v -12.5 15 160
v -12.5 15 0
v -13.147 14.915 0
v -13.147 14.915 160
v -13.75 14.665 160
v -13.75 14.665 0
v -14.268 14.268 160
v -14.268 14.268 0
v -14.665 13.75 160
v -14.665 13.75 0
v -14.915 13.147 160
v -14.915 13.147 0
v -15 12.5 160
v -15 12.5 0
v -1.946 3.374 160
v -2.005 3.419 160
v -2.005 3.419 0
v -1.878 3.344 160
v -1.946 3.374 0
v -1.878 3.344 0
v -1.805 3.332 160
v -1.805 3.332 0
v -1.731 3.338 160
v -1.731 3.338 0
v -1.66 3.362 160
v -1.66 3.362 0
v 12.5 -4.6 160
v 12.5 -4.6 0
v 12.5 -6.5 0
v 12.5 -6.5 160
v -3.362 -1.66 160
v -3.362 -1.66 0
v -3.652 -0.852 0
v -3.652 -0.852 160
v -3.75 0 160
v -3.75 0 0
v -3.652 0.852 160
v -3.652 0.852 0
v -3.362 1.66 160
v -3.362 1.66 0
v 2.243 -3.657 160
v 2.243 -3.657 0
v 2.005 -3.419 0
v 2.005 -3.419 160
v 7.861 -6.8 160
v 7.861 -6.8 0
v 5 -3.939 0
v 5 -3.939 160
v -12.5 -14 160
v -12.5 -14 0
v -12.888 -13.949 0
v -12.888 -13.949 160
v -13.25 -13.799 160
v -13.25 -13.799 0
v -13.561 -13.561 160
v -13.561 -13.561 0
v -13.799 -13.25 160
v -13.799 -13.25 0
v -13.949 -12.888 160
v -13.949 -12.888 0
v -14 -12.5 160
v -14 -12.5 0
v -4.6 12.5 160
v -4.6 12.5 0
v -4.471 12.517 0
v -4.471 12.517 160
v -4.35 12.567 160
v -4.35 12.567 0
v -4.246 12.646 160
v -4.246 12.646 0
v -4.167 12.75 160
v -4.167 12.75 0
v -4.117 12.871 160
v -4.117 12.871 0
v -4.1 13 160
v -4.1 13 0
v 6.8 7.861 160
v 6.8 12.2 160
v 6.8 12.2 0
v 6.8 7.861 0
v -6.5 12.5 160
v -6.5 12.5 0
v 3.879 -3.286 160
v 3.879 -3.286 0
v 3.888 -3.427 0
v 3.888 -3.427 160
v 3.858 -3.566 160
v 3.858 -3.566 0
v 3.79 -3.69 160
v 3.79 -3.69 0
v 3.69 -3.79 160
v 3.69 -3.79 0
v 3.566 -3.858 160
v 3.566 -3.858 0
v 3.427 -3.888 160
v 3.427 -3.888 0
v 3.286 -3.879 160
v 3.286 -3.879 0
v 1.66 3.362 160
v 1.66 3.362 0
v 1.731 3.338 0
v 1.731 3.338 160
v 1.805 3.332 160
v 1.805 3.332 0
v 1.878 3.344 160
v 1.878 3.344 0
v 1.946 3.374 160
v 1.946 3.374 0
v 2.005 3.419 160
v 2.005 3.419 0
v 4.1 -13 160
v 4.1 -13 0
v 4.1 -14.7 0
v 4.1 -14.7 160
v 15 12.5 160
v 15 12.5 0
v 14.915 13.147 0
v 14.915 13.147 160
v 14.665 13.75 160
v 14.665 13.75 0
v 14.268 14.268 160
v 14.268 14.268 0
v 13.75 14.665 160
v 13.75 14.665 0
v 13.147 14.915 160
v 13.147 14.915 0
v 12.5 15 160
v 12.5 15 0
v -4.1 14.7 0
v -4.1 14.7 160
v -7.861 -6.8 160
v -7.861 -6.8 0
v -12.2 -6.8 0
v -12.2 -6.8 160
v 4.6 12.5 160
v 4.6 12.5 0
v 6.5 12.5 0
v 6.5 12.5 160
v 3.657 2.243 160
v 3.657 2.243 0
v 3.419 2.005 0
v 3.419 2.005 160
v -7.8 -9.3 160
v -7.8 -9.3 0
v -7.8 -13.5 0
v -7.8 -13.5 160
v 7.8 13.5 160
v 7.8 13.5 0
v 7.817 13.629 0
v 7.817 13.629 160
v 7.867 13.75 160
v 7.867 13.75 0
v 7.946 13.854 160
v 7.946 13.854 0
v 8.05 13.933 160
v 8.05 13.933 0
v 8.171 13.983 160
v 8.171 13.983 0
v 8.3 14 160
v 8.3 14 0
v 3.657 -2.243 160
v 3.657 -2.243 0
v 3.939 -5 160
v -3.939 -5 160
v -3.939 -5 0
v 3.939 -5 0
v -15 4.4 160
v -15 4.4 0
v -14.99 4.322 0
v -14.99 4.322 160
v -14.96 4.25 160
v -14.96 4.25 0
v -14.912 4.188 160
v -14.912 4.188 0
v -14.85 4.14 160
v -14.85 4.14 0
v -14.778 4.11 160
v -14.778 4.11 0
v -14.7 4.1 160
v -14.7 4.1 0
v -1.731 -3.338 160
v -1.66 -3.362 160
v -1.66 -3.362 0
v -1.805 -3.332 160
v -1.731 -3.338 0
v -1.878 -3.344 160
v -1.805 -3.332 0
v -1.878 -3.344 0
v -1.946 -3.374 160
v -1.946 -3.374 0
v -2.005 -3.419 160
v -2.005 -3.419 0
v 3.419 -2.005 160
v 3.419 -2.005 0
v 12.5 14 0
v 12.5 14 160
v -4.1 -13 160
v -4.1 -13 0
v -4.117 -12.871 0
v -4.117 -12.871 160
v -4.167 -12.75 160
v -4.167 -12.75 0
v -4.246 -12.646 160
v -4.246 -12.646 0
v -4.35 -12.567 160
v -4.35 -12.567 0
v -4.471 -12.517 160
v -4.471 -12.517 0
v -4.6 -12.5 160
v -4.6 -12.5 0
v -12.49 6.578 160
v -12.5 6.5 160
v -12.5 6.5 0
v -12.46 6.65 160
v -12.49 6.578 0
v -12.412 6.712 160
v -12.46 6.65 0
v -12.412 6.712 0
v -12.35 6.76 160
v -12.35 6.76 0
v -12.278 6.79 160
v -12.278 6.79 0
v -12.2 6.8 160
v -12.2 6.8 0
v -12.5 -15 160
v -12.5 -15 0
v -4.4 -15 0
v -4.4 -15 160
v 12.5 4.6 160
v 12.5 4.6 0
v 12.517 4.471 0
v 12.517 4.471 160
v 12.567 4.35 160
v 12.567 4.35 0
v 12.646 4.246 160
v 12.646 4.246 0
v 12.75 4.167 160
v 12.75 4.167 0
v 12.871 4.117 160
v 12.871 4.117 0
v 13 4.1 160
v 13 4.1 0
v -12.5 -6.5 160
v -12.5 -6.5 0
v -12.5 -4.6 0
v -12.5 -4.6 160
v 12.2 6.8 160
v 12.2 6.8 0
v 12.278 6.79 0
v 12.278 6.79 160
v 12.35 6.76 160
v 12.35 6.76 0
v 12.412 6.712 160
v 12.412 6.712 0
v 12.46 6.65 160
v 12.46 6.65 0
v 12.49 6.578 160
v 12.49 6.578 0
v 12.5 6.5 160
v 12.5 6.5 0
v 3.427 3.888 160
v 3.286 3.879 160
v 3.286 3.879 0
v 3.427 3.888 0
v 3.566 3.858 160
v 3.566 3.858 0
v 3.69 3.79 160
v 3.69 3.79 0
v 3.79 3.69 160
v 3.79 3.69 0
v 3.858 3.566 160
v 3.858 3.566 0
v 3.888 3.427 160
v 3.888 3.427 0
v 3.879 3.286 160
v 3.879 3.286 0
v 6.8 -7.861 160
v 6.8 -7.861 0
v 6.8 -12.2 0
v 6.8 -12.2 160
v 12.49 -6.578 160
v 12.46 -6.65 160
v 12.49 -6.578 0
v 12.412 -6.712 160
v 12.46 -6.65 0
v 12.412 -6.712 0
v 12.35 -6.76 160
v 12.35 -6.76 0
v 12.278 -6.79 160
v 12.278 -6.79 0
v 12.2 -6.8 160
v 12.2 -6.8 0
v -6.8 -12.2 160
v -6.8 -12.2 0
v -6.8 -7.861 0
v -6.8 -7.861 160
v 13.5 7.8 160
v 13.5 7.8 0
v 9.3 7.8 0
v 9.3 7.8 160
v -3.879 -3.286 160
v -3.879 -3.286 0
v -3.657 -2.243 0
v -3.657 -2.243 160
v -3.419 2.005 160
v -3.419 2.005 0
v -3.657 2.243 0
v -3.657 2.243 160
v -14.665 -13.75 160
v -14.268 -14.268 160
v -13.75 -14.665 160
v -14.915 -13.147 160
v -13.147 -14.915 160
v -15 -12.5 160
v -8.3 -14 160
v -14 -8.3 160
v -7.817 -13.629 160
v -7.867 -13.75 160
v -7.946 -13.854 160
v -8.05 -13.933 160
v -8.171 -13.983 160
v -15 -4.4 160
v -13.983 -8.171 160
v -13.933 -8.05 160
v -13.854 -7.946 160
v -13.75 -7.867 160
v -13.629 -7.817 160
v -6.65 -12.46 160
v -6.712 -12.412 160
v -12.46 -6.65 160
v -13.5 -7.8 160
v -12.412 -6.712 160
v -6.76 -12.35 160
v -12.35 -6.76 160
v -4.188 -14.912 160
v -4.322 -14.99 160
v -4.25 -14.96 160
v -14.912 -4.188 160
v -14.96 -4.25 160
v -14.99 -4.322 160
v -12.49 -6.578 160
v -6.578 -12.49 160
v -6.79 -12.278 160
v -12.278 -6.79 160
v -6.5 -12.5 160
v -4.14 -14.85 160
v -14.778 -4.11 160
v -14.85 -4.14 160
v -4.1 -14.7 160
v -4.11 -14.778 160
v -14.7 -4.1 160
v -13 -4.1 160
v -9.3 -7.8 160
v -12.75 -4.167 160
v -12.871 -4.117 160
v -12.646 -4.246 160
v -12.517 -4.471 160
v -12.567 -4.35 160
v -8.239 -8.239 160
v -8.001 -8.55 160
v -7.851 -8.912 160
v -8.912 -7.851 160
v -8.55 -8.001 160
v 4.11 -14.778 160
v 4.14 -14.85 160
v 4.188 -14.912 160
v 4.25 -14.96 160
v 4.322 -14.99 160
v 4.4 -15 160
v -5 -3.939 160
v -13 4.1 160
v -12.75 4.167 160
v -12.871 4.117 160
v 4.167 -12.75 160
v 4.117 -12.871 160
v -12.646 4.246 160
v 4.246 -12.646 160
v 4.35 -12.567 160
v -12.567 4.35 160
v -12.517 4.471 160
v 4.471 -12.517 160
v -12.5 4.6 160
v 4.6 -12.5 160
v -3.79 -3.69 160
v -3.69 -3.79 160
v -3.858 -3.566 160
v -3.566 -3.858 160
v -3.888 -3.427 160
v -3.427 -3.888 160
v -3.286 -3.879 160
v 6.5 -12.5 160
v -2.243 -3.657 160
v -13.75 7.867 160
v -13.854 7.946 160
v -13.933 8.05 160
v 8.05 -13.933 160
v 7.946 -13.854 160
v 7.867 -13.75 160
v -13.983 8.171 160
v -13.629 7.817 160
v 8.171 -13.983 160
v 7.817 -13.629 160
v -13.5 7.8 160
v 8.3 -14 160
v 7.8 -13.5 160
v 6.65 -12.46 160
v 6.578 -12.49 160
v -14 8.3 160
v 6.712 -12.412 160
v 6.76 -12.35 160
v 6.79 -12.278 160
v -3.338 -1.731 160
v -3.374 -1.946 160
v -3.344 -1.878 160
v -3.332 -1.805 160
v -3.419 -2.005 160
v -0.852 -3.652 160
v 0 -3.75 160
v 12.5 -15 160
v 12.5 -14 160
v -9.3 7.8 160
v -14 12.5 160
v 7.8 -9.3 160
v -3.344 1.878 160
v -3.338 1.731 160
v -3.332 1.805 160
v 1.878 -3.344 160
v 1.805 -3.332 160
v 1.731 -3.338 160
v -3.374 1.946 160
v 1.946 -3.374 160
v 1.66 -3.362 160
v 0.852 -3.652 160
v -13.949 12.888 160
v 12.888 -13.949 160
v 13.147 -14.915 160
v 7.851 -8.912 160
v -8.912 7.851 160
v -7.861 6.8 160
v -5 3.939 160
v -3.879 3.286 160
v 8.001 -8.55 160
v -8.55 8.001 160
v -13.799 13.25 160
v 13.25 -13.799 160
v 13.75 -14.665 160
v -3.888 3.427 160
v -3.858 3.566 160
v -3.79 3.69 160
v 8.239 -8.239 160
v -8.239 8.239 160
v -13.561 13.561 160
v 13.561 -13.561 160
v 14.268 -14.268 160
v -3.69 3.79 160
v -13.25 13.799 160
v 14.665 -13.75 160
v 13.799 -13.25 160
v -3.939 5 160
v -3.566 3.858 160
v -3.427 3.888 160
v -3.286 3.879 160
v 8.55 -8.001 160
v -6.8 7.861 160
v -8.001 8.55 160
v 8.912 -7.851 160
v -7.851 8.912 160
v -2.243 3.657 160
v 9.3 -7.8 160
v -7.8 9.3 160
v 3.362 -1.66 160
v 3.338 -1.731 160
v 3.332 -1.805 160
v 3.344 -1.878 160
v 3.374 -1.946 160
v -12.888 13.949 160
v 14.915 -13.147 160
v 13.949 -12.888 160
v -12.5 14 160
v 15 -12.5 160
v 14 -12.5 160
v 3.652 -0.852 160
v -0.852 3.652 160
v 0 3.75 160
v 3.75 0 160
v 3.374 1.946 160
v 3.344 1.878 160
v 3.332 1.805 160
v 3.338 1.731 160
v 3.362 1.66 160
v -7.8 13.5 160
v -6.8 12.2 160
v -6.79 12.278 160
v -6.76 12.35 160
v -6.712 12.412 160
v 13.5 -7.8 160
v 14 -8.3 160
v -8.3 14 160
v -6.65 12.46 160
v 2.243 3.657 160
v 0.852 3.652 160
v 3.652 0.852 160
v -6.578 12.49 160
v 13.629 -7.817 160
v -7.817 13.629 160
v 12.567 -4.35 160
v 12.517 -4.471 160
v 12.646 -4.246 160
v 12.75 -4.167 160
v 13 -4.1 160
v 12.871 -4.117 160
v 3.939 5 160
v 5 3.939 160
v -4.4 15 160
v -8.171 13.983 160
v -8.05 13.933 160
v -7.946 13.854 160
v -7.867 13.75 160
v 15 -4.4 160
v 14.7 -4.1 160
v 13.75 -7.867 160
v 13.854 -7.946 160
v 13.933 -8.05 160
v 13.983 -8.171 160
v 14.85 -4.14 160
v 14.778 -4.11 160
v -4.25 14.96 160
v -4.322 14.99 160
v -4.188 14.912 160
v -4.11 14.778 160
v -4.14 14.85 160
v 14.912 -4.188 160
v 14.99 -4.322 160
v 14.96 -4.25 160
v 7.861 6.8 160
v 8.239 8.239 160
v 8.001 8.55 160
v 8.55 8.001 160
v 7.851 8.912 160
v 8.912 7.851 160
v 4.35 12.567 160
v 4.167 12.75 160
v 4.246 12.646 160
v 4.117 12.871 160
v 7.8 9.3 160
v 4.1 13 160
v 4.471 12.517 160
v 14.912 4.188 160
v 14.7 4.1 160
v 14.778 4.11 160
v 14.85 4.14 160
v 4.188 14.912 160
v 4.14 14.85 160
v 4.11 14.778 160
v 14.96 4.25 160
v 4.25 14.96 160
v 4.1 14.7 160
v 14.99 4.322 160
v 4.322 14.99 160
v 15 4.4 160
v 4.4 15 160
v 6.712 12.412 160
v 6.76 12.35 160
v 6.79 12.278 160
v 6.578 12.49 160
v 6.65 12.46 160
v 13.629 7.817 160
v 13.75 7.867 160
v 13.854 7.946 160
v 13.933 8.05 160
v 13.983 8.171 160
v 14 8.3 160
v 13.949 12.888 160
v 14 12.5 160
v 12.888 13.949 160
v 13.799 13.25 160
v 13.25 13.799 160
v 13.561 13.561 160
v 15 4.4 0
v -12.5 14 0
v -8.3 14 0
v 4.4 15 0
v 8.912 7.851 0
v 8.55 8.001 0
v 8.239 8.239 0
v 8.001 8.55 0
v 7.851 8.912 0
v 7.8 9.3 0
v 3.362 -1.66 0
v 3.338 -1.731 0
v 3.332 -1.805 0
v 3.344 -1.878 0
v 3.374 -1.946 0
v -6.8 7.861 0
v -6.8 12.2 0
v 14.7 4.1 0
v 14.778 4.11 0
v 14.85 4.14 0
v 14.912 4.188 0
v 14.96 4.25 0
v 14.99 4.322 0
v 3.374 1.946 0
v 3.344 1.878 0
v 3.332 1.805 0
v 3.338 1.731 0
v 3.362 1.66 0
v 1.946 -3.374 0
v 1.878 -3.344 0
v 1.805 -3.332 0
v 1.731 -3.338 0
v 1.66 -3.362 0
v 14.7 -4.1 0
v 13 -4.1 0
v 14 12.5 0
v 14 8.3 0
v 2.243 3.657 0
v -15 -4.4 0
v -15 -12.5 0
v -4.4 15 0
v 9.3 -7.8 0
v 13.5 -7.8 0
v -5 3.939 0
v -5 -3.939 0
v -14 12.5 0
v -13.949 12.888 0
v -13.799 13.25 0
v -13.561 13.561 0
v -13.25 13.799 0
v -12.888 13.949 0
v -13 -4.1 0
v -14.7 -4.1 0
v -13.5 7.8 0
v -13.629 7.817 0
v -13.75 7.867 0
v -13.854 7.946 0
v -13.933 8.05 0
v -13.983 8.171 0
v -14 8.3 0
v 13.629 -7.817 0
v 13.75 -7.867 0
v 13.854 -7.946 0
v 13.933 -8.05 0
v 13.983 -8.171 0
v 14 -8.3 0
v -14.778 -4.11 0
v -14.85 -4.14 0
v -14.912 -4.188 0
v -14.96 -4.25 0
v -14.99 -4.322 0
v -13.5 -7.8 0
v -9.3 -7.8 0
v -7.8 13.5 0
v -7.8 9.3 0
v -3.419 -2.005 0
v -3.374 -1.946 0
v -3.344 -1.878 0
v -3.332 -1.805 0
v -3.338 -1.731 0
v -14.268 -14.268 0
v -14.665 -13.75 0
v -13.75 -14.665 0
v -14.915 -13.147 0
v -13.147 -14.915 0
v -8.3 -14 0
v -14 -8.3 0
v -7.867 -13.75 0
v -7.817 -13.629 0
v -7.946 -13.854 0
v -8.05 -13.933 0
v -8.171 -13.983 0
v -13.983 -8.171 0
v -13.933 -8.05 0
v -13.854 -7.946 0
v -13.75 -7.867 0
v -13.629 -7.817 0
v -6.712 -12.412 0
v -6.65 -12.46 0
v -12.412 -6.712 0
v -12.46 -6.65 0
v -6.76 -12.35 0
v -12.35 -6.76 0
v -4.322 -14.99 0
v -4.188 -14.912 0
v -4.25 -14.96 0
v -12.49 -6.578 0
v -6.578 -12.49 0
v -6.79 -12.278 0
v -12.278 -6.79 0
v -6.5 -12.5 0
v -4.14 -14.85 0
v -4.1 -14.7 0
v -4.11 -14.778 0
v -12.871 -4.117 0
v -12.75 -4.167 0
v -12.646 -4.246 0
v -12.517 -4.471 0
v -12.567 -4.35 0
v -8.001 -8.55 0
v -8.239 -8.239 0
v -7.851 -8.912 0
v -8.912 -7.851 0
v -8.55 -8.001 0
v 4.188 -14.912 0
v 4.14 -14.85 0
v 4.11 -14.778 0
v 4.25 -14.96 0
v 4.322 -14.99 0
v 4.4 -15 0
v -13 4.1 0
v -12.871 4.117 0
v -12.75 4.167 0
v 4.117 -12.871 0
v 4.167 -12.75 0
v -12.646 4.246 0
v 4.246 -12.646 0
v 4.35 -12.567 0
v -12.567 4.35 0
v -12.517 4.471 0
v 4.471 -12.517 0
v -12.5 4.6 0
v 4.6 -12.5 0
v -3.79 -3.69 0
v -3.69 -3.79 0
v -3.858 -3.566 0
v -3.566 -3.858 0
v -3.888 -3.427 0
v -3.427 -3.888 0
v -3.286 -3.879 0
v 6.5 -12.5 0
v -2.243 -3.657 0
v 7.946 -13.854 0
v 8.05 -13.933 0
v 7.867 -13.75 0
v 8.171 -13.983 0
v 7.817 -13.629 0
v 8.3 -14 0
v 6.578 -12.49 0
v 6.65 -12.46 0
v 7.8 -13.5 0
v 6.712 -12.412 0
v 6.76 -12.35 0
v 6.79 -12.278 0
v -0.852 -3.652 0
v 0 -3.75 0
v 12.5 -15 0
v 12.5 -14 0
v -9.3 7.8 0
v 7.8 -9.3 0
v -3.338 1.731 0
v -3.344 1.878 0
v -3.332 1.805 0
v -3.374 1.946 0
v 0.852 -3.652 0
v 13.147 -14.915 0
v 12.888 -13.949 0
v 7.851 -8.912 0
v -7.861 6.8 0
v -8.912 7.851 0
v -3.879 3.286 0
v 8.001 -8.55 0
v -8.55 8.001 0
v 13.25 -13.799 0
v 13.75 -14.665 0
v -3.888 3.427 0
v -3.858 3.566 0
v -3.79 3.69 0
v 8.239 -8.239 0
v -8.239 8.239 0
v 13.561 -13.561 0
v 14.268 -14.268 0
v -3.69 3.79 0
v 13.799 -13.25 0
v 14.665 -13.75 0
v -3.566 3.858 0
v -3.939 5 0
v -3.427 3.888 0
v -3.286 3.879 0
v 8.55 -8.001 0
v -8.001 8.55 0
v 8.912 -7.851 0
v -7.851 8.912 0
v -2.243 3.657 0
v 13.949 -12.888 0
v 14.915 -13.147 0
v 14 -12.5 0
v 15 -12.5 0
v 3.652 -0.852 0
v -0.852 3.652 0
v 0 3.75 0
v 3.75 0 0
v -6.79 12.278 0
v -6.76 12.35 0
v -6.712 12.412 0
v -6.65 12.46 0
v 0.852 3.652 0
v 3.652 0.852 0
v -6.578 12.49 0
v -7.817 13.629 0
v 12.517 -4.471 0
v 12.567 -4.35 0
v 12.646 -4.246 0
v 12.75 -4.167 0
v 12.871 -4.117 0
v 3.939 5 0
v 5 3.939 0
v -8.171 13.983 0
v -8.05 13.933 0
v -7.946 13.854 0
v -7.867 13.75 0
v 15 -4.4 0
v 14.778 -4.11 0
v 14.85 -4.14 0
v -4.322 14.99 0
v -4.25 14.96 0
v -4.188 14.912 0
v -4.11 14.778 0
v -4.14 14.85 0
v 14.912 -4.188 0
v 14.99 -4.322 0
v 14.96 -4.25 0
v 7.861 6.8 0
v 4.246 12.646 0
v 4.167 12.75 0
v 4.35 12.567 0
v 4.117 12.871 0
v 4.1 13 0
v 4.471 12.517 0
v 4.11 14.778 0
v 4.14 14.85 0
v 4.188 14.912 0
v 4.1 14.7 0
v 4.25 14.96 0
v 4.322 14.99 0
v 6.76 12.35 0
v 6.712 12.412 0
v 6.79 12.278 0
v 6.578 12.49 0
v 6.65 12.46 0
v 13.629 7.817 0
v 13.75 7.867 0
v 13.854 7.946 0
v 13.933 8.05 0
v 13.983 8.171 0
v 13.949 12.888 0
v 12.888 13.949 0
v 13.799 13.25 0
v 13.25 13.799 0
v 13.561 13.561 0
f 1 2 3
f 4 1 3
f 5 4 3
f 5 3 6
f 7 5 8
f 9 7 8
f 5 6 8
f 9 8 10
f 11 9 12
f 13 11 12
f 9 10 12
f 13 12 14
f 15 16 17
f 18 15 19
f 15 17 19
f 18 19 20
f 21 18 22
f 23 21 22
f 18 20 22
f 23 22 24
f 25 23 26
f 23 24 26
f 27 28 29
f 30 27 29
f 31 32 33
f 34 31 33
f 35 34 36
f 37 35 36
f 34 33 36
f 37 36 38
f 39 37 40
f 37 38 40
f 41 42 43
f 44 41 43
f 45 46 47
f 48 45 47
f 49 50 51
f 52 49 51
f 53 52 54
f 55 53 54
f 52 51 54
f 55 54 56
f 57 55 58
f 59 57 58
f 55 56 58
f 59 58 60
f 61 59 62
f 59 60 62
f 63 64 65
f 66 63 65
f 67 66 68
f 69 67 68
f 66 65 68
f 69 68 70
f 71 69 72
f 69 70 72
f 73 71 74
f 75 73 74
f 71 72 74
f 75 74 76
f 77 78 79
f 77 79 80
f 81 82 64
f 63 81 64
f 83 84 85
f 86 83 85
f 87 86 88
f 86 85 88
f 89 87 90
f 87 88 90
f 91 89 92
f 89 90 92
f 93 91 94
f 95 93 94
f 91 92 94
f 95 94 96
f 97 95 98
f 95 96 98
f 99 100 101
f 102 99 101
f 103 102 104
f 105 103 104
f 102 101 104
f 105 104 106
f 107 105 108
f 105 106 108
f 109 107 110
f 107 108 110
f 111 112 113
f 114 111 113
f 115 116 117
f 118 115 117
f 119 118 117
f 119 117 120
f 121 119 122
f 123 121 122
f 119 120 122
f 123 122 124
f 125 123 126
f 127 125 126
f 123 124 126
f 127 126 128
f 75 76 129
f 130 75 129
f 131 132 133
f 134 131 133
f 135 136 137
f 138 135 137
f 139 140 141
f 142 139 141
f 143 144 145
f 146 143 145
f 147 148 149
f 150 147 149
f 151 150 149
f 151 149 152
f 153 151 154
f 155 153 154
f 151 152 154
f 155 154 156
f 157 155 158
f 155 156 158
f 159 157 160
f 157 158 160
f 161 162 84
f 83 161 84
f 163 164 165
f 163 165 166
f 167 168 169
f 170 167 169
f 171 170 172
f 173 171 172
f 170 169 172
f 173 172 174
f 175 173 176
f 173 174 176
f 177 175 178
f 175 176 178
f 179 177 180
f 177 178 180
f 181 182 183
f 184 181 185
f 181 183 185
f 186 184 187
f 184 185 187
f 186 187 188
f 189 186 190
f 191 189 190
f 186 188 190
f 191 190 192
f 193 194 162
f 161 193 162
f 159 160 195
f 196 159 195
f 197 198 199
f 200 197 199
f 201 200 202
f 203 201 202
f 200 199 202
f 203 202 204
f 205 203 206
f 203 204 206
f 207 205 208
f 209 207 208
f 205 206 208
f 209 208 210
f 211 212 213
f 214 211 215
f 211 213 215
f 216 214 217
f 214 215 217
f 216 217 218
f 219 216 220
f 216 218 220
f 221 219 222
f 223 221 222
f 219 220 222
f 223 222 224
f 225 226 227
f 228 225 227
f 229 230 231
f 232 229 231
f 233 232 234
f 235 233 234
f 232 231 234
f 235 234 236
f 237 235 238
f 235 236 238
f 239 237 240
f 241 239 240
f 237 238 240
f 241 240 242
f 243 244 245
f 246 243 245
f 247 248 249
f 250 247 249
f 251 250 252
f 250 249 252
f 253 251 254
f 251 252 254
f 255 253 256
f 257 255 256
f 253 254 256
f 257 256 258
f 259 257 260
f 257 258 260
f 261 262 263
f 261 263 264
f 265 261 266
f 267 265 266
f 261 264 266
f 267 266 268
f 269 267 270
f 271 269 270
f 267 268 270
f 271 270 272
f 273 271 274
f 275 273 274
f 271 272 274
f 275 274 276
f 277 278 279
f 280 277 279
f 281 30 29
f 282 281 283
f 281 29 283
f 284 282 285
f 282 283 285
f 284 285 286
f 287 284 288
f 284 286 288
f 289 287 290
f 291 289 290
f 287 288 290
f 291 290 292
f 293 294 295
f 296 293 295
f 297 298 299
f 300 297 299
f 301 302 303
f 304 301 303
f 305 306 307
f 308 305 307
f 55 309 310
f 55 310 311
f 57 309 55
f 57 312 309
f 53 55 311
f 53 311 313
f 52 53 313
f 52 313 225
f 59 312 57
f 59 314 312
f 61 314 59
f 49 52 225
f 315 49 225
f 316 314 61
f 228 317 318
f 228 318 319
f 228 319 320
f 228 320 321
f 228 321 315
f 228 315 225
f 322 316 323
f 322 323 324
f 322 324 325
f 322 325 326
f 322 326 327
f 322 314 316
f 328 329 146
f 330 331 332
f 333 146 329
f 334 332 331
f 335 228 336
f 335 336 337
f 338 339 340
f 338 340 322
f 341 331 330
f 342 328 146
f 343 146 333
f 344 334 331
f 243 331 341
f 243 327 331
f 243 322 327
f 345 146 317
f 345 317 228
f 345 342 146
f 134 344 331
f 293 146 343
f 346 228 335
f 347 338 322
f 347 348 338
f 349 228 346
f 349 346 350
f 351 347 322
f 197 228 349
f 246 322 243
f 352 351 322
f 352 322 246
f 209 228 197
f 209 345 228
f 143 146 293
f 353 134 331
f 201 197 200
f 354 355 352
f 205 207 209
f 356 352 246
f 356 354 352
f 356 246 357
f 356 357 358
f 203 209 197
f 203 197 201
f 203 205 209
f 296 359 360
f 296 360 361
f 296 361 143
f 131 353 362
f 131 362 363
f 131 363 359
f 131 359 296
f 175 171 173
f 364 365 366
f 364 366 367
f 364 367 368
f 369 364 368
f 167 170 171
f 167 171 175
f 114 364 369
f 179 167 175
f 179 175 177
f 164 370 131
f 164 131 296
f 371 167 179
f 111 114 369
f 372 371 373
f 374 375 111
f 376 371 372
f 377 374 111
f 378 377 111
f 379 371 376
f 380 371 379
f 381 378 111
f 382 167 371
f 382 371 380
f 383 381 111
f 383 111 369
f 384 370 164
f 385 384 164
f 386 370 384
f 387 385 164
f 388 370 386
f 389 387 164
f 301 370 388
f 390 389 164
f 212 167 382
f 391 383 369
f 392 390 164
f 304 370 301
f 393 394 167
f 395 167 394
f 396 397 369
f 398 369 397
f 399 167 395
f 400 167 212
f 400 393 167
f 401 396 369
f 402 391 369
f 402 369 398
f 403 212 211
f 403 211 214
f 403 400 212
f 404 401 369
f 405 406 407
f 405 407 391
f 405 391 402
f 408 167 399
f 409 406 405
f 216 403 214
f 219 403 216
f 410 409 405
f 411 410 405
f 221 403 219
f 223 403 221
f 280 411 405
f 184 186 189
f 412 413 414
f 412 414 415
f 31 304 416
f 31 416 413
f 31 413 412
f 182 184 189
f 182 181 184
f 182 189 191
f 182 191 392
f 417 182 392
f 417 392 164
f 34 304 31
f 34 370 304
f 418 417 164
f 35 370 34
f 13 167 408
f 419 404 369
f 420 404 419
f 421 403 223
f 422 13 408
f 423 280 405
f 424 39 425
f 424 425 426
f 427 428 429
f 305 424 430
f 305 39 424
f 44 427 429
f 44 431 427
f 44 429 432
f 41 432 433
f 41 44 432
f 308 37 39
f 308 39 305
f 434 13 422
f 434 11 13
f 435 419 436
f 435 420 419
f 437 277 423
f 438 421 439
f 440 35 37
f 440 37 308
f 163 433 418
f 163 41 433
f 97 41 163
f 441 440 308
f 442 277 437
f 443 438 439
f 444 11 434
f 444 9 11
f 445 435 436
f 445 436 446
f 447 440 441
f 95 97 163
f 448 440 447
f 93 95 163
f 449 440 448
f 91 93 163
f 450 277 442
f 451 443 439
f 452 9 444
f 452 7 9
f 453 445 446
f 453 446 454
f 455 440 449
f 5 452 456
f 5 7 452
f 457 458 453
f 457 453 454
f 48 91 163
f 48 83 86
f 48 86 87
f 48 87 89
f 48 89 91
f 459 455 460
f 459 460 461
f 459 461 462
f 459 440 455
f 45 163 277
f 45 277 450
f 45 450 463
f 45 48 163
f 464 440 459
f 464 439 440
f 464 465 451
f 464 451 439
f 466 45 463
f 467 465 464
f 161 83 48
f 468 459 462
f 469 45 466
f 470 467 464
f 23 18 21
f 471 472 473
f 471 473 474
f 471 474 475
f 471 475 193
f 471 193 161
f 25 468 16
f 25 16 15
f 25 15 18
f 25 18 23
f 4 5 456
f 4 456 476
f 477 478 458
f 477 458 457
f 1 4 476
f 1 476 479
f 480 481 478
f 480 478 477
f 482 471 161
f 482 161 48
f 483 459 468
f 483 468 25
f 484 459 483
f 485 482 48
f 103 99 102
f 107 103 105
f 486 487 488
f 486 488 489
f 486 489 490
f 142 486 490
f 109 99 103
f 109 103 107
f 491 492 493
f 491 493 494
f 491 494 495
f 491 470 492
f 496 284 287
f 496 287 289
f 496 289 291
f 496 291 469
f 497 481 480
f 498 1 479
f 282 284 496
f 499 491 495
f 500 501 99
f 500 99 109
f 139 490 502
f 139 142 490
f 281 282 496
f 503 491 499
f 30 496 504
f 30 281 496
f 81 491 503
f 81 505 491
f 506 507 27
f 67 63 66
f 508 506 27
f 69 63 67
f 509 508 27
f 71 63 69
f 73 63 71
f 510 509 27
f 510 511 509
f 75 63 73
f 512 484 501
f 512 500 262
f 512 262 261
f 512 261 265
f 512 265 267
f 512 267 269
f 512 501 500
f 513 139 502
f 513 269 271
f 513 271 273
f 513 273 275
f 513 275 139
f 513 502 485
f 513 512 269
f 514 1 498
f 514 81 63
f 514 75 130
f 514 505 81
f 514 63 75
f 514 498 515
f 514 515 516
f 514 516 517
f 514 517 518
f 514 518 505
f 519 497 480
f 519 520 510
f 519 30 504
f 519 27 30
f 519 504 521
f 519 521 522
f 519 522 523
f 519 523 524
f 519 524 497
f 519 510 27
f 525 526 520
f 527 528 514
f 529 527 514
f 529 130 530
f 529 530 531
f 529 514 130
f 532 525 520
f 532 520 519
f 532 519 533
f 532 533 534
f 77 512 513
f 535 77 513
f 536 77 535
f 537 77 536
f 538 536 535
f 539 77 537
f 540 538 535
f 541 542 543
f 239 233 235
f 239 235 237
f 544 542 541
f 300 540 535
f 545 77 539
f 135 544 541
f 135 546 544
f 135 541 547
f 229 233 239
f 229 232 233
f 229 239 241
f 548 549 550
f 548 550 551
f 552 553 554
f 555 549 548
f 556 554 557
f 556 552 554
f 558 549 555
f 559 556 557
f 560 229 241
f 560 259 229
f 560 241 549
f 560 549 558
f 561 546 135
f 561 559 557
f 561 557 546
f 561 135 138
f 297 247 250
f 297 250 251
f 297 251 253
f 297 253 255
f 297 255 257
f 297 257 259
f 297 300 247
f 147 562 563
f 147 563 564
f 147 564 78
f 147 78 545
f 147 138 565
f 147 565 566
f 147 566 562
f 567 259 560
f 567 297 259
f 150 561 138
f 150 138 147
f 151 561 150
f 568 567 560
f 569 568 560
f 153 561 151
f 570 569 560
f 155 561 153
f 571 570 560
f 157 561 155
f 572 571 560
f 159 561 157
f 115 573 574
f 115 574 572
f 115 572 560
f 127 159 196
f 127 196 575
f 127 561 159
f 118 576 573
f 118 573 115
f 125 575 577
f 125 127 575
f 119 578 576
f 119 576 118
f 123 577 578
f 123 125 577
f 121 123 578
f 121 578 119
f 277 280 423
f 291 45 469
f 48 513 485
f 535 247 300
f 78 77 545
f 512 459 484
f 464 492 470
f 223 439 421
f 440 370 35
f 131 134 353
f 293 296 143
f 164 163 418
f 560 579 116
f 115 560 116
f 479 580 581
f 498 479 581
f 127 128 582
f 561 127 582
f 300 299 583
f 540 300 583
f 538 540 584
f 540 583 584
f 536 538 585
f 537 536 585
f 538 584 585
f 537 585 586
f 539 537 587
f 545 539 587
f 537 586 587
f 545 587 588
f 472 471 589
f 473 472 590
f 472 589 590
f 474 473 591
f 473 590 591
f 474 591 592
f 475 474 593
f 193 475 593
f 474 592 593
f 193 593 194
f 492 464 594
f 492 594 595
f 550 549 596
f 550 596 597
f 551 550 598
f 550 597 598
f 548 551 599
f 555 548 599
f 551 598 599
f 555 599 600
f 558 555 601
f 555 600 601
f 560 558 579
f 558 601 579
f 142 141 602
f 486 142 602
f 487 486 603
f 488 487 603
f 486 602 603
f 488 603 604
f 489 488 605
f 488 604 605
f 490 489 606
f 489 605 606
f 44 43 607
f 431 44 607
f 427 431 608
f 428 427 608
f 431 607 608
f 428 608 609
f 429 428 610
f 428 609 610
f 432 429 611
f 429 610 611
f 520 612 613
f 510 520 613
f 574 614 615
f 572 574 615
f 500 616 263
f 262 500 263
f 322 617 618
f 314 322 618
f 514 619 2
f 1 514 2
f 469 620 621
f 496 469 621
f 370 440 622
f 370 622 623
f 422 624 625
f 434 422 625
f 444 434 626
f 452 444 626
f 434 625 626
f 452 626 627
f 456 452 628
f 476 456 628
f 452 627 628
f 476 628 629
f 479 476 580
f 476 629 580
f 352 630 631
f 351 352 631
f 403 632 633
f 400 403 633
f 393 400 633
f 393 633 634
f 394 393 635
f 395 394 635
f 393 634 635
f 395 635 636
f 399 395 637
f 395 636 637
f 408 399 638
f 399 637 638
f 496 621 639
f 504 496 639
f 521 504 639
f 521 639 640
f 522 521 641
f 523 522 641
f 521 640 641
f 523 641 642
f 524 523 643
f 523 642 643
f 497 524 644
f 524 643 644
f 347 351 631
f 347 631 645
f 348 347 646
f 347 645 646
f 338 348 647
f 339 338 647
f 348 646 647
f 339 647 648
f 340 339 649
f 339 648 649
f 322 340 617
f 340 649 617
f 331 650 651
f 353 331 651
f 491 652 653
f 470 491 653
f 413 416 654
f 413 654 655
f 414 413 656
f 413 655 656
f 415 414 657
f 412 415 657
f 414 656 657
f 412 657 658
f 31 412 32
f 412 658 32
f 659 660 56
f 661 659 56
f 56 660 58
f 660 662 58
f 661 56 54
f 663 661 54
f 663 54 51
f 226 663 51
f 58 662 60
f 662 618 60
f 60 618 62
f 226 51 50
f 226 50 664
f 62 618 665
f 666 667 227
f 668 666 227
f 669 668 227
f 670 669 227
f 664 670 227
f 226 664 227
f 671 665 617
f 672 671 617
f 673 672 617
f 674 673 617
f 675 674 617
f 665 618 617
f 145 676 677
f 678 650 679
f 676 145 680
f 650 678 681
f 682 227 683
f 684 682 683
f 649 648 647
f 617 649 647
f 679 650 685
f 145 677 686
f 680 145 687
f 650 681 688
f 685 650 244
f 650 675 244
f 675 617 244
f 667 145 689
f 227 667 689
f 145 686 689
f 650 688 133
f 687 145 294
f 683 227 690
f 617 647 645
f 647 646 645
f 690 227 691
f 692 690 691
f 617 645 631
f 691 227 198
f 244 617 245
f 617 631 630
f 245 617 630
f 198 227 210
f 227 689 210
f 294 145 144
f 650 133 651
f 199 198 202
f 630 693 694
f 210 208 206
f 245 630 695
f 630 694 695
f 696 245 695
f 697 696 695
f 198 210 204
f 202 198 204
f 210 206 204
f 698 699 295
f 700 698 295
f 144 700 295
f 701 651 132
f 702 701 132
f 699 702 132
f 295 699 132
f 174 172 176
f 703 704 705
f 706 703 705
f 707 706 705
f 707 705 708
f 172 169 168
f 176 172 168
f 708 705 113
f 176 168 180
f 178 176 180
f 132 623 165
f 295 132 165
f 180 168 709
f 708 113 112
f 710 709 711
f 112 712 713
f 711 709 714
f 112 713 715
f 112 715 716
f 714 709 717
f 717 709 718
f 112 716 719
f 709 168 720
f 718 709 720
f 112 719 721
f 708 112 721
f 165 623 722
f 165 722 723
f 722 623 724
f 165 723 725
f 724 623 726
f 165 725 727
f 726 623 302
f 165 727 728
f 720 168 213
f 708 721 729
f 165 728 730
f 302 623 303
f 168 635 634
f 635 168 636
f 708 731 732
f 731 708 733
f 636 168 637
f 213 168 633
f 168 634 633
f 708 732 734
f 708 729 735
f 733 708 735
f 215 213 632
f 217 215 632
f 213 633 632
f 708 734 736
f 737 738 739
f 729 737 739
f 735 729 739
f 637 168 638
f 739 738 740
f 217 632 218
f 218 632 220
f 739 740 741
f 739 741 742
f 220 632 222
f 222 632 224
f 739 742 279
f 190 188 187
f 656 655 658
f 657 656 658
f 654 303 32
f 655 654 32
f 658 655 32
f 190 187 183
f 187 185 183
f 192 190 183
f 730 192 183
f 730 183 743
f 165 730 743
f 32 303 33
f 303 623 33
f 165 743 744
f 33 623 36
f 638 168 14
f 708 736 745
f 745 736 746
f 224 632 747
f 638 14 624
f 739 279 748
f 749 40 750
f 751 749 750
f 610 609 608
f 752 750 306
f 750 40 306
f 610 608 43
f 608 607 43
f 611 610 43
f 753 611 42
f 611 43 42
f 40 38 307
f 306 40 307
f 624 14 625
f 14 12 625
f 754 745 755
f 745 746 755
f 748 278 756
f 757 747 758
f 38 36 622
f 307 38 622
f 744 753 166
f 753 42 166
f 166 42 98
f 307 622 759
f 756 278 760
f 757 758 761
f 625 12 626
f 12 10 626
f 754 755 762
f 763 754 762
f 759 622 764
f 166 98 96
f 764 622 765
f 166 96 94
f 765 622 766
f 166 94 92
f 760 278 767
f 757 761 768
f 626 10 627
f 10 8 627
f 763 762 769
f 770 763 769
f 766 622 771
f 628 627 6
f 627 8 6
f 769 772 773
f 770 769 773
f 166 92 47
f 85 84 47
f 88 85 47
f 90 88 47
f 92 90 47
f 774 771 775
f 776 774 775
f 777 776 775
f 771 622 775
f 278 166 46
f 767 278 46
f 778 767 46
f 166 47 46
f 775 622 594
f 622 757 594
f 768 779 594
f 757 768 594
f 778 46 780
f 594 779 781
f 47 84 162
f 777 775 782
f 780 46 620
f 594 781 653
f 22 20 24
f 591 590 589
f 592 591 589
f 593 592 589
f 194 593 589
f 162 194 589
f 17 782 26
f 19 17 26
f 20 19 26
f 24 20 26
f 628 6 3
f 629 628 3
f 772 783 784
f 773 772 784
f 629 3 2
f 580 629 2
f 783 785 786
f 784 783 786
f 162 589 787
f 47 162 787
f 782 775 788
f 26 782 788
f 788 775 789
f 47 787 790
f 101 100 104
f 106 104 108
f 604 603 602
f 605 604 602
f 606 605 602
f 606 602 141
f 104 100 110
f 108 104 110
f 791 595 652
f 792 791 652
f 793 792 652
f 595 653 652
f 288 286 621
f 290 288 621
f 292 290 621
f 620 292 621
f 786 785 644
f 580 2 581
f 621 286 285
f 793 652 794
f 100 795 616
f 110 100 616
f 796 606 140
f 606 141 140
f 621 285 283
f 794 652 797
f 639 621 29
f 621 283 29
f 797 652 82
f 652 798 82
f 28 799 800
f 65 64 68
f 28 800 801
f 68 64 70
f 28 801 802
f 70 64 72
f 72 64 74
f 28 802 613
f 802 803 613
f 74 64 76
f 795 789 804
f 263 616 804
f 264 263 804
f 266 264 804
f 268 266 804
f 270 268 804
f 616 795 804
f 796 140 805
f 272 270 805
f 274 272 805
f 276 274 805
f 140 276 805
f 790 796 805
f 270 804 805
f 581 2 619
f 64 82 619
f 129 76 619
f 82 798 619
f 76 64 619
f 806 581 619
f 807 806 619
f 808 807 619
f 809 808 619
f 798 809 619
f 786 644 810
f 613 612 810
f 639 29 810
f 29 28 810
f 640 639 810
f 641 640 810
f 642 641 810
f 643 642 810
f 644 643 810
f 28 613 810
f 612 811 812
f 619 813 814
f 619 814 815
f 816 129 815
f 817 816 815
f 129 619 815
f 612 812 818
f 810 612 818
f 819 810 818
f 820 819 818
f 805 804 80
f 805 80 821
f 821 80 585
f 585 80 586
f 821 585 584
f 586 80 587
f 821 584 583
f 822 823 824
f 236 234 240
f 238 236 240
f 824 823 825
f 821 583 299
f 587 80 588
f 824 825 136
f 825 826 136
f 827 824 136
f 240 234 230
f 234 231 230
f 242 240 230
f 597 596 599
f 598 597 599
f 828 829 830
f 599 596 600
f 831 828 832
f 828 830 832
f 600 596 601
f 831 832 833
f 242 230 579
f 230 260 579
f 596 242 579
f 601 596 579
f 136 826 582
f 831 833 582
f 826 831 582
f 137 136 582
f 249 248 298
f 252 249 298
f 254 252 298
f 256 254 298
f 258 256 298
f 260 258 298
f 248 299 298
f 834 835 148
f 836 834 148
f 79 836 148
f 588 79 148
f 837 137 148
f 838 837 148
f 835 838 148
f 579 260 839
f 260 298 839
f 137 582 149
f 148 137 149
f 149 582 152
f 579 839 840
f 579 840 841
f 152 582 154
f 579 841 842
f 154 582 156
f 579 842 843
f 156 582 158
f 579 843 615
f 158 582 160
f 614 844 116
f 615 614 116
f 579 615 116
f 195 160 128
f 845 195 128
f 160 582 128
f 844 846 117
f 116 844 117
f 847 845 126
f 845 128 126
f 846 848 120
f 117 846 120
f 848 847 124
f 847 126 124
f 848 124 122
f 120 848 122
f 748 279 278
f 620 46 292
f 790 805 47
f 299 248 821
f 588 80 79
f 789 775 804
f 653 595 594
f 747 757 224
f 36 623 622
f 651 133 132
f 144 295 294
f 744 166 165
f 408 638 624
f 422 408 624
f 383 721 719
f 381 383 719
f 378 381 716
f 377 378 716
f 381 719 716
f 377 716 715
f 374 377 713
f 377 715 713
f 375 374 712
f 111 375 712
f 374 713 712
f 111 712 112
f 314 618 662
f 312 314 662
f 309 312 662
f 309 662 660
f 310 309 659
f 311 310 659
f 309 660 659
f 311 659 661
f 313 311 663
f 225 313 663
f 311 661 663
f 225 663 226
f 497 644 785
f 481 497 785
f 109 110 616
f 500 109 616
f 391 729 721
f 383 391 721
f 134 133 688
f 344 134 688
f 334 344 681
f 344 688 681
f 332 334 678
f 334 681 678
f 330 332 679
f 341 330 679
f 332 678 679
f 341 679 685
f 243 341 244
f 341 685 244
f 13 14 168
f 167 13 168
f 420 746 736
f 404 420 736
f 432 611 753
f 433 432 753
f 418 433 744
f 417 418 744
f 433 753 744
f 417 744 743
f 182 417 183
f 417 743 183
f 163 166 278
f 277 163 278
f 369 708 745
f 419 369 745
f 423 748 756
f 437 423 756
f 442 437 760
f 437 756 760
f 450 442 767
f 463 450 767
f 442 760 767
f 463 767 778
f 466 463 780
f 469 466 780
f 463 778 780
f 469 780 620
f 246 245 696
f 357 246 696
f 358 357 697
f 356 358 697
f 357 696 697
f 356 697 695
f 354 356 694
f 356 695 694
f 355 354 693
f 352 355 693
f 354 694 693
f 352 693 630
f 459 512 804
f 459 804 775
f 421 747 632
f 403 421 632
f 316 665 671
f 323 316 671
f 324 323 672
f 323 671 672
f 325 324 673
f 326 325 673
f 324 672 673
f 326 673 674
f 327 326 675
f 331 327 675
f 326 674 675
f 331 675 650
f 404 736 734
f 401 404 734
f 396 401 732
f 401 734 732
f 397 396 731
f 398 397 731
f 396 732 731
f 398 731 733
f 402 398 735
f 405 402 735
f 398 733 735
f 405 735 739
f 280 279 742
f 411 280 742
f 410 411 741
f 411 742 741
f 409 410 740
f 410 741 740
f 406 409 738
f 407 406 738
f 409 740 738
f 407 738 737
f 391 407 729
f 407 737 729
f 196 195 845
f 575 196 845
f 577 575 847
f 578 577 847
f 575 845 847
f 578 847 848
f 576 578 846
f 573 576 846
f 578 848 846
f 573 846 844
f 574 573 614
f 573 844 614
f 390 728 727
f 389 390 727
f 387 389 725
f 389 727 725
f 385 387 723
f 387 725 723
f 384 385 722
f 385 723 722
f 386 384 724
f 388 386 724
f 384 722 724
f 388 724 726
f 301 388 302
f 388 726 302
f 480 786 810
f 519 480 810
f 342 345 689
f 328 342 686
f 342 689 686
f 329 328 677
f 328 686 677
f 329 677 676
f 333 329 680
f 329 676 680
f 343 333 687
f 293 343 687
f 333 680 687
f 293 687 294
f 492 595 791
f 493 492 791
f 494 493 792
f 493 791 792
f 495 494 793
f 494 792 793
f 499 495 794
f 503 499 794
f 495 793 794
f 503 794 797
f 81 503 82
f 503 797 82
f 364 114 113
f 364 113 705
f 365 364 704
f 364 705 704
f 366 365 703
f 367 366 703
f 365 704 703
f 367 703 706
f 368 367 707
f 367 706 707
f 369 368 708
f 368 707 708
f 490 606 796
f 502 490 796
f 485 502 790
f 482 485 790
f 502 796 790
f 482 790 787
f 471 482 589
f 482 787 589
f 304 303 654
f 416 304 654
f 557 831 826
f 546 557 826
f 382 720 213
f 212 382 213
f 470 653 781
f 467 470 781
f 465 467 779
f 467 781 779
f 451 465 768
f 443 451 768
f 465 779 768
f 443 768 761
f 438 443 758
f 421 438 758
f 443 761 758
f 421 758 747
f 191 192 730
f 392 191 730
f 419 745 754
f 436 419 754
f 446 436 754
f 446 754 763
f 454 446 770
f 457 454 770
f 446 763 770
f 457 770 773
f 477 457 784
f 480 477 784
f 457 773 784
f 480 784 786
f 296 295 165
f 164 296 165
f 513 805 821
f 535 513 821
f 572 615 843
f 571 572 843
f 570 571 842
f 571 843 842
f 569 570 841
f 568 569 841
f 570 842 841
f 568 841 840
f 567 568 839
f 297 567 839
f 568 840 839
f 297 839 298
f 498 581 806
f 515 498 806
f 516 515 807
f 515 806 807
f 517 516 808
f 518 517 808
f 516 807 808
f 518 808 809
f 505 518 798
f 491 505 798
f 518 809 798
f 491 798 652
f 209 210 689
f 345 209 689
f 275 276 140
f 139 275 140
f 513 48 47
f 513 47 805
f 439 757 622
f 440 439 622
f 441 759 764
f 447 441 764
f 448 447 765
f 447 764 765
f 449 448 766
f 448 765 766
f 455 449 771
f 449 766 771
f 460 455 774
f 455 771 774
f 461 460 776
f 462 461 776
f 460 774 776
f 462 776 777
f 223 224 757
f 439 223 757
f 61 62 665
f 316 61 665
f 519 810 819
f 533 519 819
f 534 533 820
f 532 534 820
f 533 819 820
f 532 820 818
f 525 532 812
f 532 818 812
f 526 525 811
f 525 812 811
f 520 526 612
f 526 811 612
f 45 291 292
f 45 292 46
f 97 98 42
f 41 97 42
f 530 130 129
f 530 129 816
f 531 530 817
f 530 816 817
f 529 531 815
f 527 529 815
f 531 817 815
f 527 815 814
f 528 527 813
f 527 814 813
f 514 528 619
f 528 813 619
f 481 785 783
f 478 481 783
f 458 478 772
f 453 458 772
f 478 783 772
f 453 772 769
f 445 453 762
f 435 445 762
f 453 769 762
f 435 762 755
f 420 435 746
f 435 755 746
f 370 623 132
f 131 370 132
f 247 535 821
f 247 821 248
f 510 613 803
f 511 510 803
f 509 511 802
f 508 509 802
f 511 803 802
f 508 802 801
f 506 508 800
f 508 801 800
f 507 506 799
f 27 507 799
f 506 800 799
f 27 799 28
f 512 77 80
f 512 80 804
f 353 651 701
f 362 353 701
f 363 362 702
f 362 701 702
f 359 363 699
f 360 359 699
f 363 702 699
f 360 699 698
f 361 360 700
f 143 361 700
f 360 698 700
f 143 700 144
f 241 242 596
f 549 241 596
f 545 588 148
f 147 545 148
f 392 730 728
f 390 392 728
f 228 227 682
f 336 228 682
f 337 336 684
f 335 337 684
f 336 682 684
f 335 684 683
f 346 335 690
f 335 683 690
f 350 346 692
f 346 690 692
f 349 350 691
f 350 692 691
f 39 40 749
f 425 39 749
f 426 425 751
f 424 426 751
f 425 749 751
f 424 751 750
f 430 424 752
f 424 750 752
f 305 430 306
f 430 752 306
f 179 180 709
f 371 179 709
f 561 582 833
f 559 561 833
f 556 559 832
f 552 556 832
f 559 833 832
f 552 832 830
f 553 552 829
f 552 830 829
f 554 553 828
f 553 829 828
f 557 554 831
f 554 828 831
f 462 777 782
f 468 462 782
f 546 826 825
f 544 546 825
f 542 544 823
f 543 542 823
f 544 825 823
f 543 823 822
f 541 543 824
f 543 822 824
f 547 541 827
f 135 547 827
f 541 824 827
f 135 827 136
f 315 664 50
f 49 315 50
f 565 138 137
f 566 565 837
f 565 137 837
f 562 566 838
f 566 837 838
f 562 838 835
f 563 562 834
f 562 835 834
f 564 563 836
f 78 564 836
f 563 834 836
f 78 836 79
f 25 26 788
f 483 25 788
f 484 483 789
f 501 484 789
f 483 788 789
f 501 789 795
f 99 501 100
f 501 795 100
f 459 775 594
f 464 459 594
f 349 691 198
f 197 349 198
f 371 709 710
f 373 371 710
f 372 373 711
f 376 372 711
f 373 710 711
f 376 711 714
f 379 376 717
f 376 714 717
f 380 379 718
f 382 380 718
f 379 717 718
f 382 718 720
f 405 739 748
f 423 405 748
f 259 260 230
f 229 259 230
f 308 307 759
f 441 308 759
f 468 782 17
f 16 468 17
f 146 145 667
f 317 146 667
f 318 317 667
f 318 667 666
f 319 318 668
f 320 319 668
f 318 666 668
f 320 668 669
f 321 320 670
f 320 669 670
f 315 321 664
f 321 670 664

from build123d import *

# Parameters (mm, degrees)
F1_DEPTH = 160


# Not quite as in the source:
# - ends of sketch curves that miss each other by under 0.0002 mm in the source are joined
# - the program builds the solid bodies; features that only make, move or delete a surface that nothing else refers to are left out


with BuildPart() as f1:
    # F0 (on Top) → F1 (new body)
    with BuildSketch(Plane.XY):
        with BuildLine():
            Line((3.939341, -5), (6.799995, -7.860656))
            Line((6.799995, -7.860656), (6.799995, -12.199997))
            ThreePointArc((6.799995, -12.199997), (6.7121307415, -12.4121300846), (6.5, -12.5))
            Line((6.5, -12.5), (4.599998, -12.5))
            ThreePointArc((4.599998, -12.5), (4.2464446094, -12.6464466094), (4.099998, -13))
            Line((4.099998, -13), (4.099998, -14.699997))
            ThreePointArc((4.099998, -14.699997), (4.1878632585, -14.9121300846), (4.399994, -15))
            Line((4.399994, -15), (12.5, -15))
            ThreePointArc((12.5, -15), (14.267766953, -14.267766953), (15, -12.5))
            Line((15, -12.5), (15, -4.399994))
            ThreePointArc((15, -4.399994), (14.9121300846, -4.1878632585), (14.699997, -4.099999))
            Line((14.699997, -4.099999), (13, -4.099998))
            ThreePointArc((13, -4.099998), (12.6464466094, -4.2464446094), (12.5, -4.599998))
            Line((12.5, -4.599998), (12.5, -6.5))
            ThreePointArc((12.5, -6.5), (12.4121300846, -6.7121307415), (12.199997, -6.799995))
            Line((12.199997, -6.799995), (7.860655, -6.799995))
            Line((7.860655, -6.799995), (5, -3.93934))
            Line((5, -3.93934), (5, 3.939341))
            Line((5, 3.939341), (7.860655, 6.799995))
            Line((7.860655, 6.799995), (12.199997, 6.799995))
            ThreePointArc((12.199997, 6.799995), (12.4121300846, 6.7121307415), (12.5, 6.5))
            Line((12.5, 6.5), (12.5, 4.599998))
            ThreePointArc((12.5, 4.599998), (12.6464466094, 4.2464446094), (13, 4.099998))
            Line((13, 4.099998), (14.699997, 4.099998))
            ThreePointArc((14.699997, 4.099998), (14.9121300846, 4.1878632585), (15, 4.399994))
            Line((15, 4.399994), (15, 12.5))
            ThreePointArc((15, 12.5), (14.267766953, 14.267766953), (12.5, 15))
            Line((12.5, 15), (4.399994, 15))
            ThreePointArc((4.399994, 15), (4.1878632585, 14.9121300846), (4.099999, 14.699997))
            Line((4.099999, 14.699997), (4.099998, 13))
            ThreePointArc((4.099998, 13), (4.2464446094, 12.6464466094), (4.599998, 12.5))
            Line((4.599998, 12.5), (6.5, 12.5))
            ThreePointArc((6.5, 12.5), (6.7121307415, 12.4121300846), (6.799995, 12.199997))
            Line((6.799995, 12.199997), (6.799995, 7.860655))
            Line((6.799995, 7.860655), (3.939341, 5))
            Line((3.939341, 5), (-3.93934, 5))
            Line((-3.93934, 5), (-6.799995, 7.860655))
            Line((-6.799995, 7.860655), (-6.799995, 12.199997))
            ThreePointArc((-6.799995, 12.199997), (-6.7121307415, 12.4121300846), (-6.5, 12.5))
            Line((-6.5, 12.5), (-4.599998, 12.5))
            ThreePointArc((-4.599998, 12.5), (-4.2464446094, 12.6464466094), (-4.099998, 13))
            Line((-4.099998, 13), (-4.099998, 14.699997))
            ThreePointArc((-4.099998, 14.699997), (-4.1878632585, 14.9121300846), (-4.399994, 15))
            Line((-4.399994, 15), (-12.5, 15))
            ThreePointArc((-12.5, 15), (-14.267766953, 14.267766953), (-15, 12.5))
            Line((-15, 12.5), (-15, 4.399994))
            ThreePointArc((-15, 4.399994), (-14.9121300846, 4.1878632585), (-14.699997, 4.099999))
            Line((-14.699997, 4.099999), (-13, 4.099998))
            ThreePointArc((-13, 4.099998), (-12.6464466094, 4.2464446094), (-12.5, 4.599998))
            Line((-12.5, 4.599998), (-12.5, 6.5))
            ThreePointArc((-12.5, 6.5), (-12.4121300846, 6.7121307415), (-12.199997, 6.799995))
            Line((-12.199997, 6.799995), (-7.860656, 6.799995))
            Line((-7.860656, 6.799995), (-5, 3.939341))
            Line((-5, 3.939341), (-5, -3.93934))
            Line((-5, -3.93934), (-7.860656, -6.799995))
            Line((-7.860656, -6.799995), (-12.199997, -6.799995))
            ThreePointArc((-12.199997, -6.799995), (-12.4121300846, -6.7121307415), (-12.5, -6.5))
            Line((-12.5, -6.5), (-12.5, -4.599998))
            ThreePointArc((-12.5, -4.599998), (-12.6464466094, -4.2464446094), (-13, -4.099998))
            Line((-13, -4.099998), (-14.699997, -4.099998))
            ThreePointArc((-14.699997, -4.099998), (-14.9121300846, -4.1878632585), (-15, -4.399994))
            Line((-15, -4.399994), (-15, -12.5))
            ThreePointArc((-15, -12.5), (-14.267766953, -14.267766953), (-12.5, -15))
            Line((-12.5, -15), (-4.399994, -15))
            ThreePointArc((-4.399994, -15), (-4.1878632585, -14.9121300846), (-4.099999, -14.699997))
            Line((-4.099999, -14.699997), (-4.099998, -13))
            ThreePointArc((-4.099998, -13), (-4.2464446094, -12.6464466094), (-4.599998, -12.5))
            Line((-4.599998, -12.5), (-6.5, -12.5))
            ThreePointArc((-6.5, -12.5), (-6.7121307415, -12.4121300846), (-6.799995, -12.199997))
            Line((-6.799995, -12.199997), (-6.799995, -7.860656))
            Line((-6.799995, -7.860656), (-3.93934, -5))
            Line((-3.93934, -5), (3.939341, -5))
        make_face()
        with BuildLine():
            Line((-8.299995, -14), (-12.5, -14))
            ThreePointArc((-12.5, -14), (-13.5606601718, -13.5606601718), (-14, -12.5))
            Line((-14, -12.5), (-14, -8.299995))
            ThreePointArc((-14, -8.299995), (-13.8535533906, -7.9464416094), (-13.5, -7.799995))
            Line((-13.5, -7.799995), (-9.299995, -7.799995))
            ThreePointArc((-9.299995, -7.799995), (-8.2393348282, -8.2393348282), (-7.799995, -9.299995))
            Line((-7.799995, -9.299995), (-7.799995, -13.5))
            ThreePointArc((-7.799995, -13.5), (-7.9464416094, -13.8535533906), (-8.299995, -14))
        make_face(mode=Mode.SUBTRACT)
        with BuildLine():
            Line((12.5, -14), (8.299995, -14))
            ThreePointArc((8.299995, -14), (7.9464416094, -13.8535533906), (7.799995, -13.5))
            Line((7.799995, -13.5), (7.799995, -9.299995))
            ThreePointArc((7.799995, -9.299995), (8.2393348282, -8.2393348282), (9.299995, -7.799995))
            Line((9.299995, -7.799995), (13.5, -7.799995))
            ThreePointArc((13.5, -7.799995), (13.8535533906, -7.9464416094), (14, -8.299995))
            Line((14, -8.299995), (14, -12.5))
            ThreePointArc((14, -12.5), (13.5606601718, -13.5606601718), (12.5, -14))
        make_face(mode=Mode.SUBTRACT)
        with BuildLine():
            Line((3.657288, -2.243073), (3.878887, -3.285876))
            ThreePointArc((3.878887, -3.285876), (3.7433613906, -3.7433613906), (3.2858769836, -3.8788870773))
            Line((3.2858769836, -3.8788870773), (2.243074, -3.657287))
            Line((2.243074, -3.657287), (2.005135, -3.419348))
            ThreePointArc((2.005135, -3.419348), (1.841799908, -3.3354753308), (1.6601868142, -3.3624816237))
            ThreePointArc((1.6601868142, -3.3624816237), (0, -3.75), (-1.6601870383, -3.3624810777))
            ThreePointArc((-1.6601870383, -3.3624810777), (-1.841799908, -3.3354753308), (-2.0051340344, -3.4193479656))
            Line((-2.0051340344, -3.4193479656), (-2.243073, -3.657287))
            Line((-2.243073, -3.657287), (-3.285876, -3.878887))
            ThreePointArc((-3.285876, -3.878887), (-3.7433613906, -3.7433613906), (-3.8788870773, -3.2858769836))
            Line((-3.8788870773, -3.2858769836), (-3.657287, -2.243073))
            Line((-3.657287, -2.243073), (-3.419348, -2.005134))
            ThreePointArc((-3.419348, -2.005134), (-3.3354753308, -1.841799908), (-3.3624816237, -1.6601868142))
            ThreePointArc((-3.3624816237, -1.6601868142), (-3.75, 0), (-3.3624810777, 1.6601870383))
            ThreePointArc((-3.3624810777, 1.6601870383), (-3.3354753883, 1.8418002569), (-3.4193484656, 2.0051345344))
            Line((-3.4193484656, 2.0051345344), (-3.657287, 2.243074))
            Line((-3.657287, 2.243074), (-3.878887, 3.285877))
            ThreePointArc((-3.878887, 3.285877), (-3.7433613906, 3.7433613906), (-3.2858769836, 3.8788870773))
            Line((-3.2858769836, 3.8788870773), (-2.243073, 3.657288))
            Line((-2.243073, 3.657288), (-2.005134, 3.419348))
            ThreePointArc((-2.005134, 3.419348), (-1.8418001264, 3.3354753668), (-1.6601872112, 3.3624814277))
            ThreePointArc((-1.6601872112, 3.3624814277), (0, 3.75), (1.6601870383, 3.3624810777))
            ThreePointArc((1.6601870383, 3.3624810777), (1.8418002569, 3.3354753883), (2.0051345344, 3.4193484656))
            Line((2.0051345344, 3.4193484656), (2.243074, 3.657288))
            Line((2.243074, 3.657288), (3.285877, 3.878887))
            ThreePointArc((3.285877, 3.878887), (3.7433610448, 3.7433617364), (3.8788872806, 3.2858779404))
            Line((3.8788872806, 3.2858779404), (3.657288, 2.243074))
            Line((3.657288, 2.243074), (3.419348, 2.005135))
            ThreePointArc((3.419348, 2.005135), (3.3354753668, 1.8418001264), (3.3624814277, 1.6601872112))
            ThreePointArc((3.3624814277, 1.6601872112), (3.75, 0), (3.3624810777, -1.6601870383))
            ThreePointArc((3.3624810777, -1.6601870383), (3.3354753308, -1.841799908), (3.4193479656, -2.0051340344))
            Line((3.4193479656, -2.0051340344), (3.657288, -2.243073))
        make_face(mode=Mode.SUBTRACT)
        with BuildLine():
            Line((-9.299995, 7.799995), (-13.5, 7.799995))
            ThreePointArc((-13.5, 7.799995), (-13.8535533906, 7.9464416094), (-14, 8.299995))
            Line((-14, 8.299995), (-14, 12.5))
            ThreePointArc((-14, 12.5), (-13.5606601718, 13.5606601718), (-12.5, 14))
            Line((-12.5, 14), (-8.299995, 14))
            ThreePointArc((-8.299995, 14), (-7.9464416094, 13.8535533906), (-7.799995, 13.5))
            Line((-7.799995, 13.5), (-7.799995, 9.299995))
            ThreePointArc((-7.799995, 9.299995), (-8.2393348282, 8.2393348282), (-9.299995, 7.799995))
        make_face(mode=Mode.SUBTRACT)
        with BuildLine():
            Line((13.5, 7.799995), (9.299995, 7.799995))
            ThreePointArc((9.299995, 7.799995), (8.2393348282, 8.2393348282), (7.799995, 9.299995))
            Line((7.799995, 9.299995), (7.799995, 13.5))
            ThreePointArc((7.799995, 13.5), (7.9464416094, 13.8535533906), (8.299995, 14))
            Line((8.299995, 14), (12.5, 14))
            ThreePointArc((12.5, 14), (13.5606601718, 13.5606601718), (14, 12.5))
            Line((14, 12.5), (14, 8.299995))
            ThreePointArc((14, 8.299995), (13.8535533906, 7.9464416094), (13.5, 7.799995))
        make_face(mode=Mode.SUBTRACT)
    extrude(amount=F1_DEPTH)


solid = f1.part
